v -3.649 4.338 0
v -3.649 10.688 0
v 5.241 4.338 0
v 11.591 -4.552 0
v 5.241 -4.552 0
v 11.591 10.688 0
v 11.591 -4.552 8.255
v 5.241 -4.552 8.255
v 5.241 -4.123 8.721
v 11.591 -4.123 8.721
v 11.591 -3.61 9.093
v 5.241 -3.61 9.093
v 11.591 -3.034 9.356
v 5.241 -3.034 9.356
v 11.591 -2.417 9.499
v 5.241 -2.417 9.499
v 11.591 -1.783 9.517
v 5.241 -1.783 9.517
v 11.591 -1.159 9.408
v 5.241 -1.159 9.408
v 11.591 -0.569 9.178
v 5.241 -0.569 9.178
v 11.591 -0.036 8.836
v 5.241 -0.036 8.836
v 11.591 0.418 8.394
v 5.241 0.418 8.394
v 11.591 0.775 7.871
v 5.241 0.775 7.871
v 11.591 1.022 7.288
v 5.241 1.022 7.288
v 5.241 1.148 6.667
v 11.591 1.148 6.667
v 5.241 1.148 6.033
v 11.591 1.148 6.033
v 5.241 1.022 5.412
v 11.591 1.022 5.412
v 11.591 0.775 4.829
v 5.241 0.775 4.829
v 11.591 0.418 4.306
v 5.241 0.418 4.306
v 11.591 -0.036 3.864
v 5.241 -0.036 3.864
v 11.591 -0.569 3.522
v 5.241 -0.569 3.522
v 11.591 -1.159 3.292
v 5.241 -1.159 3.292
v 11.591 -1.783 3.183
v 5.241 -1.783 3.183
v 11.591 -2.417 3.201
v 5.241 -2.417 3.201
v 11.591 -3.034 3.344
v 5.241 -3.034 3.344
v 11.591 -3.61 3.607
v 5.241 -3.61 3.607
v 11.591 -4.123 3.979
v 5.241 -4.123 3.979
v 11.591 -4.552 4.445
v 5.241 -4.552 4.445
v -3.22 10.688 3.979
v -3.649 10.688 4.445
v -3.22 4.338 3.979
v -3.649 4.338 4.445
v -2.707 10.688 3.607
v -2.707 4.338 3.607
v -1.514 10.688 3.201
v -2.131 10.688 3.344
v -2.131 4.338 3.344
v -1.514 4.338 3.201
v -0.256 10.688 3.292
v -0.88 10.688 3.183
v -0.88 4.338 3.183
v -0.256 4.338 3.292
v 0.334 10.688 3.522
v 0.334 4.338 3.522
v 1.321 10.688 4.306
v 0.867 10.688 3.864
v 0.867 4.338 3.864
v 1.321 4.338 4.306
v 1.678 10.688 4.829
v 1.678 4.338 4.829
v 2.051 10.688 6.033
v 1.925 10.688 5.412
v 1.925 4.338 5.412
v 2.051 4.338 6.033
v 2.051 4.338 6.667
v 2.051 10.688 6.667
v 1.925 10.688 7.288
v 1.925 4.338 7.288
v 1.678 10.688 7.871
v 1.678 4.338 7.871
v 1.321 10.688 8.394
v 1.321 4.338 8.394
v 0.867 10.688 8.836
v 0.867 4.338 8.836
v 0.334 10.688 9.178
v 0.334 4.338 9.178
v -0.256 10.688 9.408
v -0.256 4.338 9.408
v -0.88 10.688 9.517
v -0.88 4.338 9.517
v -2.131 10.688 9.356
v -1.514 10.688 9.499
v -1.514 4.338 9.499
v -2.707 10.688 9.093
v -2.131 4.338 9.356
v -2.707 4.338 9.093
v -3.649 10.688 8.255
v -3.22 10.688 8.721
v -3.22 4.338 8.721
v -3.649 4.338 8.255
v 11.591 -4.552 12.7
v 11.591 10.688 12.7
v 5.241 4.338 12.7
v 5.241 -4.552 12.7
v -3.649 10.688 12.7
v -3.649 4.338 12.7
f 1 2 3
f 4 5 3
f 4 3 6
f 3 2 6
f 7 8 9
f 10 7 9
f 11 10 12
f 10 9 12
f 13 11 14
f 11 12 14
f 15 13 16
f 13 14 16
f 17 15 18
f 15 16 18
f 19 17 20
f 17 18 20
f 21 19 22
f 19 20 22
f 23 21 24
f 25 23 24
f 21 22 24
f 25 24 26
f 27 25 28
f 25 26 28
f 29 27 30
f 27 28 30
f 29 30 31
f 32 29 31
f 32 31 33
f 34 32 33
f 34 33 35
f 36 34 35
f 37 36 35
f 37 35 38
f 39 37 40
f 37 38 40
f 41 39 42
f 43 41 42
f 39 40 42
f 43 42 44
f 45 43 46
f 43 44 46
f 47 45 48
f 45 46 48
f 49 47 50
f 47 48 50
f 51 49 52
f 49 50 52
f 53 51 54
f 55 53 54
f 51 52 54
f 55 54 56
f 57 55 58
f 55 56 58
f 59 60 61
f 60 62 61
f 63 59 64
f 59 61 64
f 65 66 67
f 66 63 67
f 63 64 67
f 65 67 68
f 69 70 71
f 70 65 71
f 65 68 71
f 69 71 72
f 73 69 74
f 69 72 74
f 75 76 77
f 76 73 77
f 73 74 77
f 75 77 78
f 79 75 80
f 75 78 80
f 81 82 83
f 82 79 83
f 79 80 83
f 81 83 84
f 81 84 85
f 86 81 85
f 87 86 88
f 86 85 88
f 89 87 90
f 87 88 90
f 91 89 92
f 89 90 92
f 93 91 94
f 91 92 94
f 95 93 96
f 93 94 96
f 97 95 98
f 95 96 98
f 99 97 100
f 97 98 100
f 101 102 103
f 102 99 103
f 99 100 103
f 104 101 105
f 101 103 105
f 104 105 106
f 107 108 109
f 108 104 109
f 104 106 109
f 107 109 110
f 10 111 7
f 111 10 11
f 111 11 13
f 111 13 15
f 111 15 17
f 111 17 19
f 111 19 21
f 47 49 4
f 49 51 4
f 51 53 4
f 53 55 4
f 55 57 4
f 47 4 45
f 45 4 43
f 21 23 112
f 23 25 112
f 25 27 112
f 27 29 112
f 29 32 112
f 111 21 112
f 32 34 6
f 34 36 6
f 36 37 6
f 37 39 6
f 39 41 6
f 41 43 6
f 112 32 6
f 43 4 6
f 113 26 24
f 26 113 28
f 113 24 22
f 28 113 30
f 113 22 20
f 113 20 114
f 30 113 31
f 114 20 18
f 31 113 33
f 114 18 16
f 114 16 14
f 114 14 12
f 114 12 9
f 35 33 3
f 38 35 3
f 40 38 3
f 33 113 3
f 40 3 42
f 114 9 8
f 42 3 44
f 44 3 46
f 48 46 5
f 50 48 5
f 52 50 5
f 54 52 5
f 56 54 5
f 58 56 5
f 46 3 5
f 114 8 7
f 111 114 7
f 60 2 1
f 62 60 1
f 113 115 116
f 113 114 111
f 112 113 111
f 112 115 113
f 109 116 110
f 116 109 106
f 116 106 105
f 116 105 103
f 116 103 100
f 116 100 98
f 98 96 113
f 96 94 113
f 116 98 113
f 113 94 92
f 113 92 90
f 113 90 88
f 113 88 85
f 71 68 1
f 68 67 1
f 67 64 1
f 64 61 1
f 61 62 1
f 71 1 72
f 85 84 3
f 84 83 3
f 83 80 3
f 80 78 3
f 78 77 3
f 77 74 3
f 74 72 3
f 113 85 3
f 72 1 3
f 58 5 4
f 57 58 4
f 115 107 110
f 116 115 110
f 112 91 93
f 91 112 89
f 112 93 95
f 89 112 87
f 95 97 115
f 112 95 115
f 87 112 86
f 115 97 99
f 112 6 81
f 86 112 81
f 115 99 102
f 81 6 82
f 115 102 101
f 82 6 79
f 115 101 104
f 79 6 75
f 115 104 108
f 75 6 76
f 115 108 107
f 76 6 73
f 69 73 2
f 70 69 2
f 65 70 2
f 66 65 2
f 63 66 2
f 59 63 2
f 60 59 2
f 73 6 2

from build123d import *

# Parameters (mm, degrees)
F1_DEPTH       = 12.7
F4_D           = 6.35
F4_DEPTH       = 25.4
F4_TIP         = 1.9077324654
F4_ON_F3_D     = 6.35
F4_ON_F3_DEPTH = 25.4
F4_ON_F3_TIP   = 1.9077324654


with BuildPart() as f1:
    # F0 (on Top) → F1 (new body)
    with BuildSketch(Plane.XY):
        Polygon((-3.6485809102, 10.6884501653), (-3.6485809102, 4.3384501653), (5.2414190898, 4.3384501653), (5.2414190898, -4.5515498347), (11.5914190898, -4.5515498347), (11.5914190898, 10.6884501653), align=None)
    extrude(amount=F1_DEPTH)

    # F4
    with Locations(Plane(origin=(0, 10.6884501653, 0), x_dir=(-1, 0, 0), z_dir=(0, 1, 0))):
        with Locations((1.1085809102, 6.35)):
            Hole(F4_D / 2, depth=F4_DEPTH)
            with Locations((0, 0, -(F4_DEPTH + F4_TIP / 2))):  # 118° drill point
                Cone(0, F4_D / 2, F4_TIP, mode=Mode.SUBTRACT)

    # F4 on F3
    with Locations(Plane.YZ.offset(11.5914190898)):
        with Locations((-2.0115498347, 6.35)):
            Hole(F4_ON_F3_D / 2, depth=F4_ON_F3_DEPTH)
            with Locations((0, 0, -(F4_ON_F3_DEPTH + F4_ON_F3_TIP / 2))):  # 118° drill point
                Cone(0, F4_ON_F3_D / 2, F4_ON_F3_TIP, mode=Mode.SUBTRACT)


solid = f1.part
